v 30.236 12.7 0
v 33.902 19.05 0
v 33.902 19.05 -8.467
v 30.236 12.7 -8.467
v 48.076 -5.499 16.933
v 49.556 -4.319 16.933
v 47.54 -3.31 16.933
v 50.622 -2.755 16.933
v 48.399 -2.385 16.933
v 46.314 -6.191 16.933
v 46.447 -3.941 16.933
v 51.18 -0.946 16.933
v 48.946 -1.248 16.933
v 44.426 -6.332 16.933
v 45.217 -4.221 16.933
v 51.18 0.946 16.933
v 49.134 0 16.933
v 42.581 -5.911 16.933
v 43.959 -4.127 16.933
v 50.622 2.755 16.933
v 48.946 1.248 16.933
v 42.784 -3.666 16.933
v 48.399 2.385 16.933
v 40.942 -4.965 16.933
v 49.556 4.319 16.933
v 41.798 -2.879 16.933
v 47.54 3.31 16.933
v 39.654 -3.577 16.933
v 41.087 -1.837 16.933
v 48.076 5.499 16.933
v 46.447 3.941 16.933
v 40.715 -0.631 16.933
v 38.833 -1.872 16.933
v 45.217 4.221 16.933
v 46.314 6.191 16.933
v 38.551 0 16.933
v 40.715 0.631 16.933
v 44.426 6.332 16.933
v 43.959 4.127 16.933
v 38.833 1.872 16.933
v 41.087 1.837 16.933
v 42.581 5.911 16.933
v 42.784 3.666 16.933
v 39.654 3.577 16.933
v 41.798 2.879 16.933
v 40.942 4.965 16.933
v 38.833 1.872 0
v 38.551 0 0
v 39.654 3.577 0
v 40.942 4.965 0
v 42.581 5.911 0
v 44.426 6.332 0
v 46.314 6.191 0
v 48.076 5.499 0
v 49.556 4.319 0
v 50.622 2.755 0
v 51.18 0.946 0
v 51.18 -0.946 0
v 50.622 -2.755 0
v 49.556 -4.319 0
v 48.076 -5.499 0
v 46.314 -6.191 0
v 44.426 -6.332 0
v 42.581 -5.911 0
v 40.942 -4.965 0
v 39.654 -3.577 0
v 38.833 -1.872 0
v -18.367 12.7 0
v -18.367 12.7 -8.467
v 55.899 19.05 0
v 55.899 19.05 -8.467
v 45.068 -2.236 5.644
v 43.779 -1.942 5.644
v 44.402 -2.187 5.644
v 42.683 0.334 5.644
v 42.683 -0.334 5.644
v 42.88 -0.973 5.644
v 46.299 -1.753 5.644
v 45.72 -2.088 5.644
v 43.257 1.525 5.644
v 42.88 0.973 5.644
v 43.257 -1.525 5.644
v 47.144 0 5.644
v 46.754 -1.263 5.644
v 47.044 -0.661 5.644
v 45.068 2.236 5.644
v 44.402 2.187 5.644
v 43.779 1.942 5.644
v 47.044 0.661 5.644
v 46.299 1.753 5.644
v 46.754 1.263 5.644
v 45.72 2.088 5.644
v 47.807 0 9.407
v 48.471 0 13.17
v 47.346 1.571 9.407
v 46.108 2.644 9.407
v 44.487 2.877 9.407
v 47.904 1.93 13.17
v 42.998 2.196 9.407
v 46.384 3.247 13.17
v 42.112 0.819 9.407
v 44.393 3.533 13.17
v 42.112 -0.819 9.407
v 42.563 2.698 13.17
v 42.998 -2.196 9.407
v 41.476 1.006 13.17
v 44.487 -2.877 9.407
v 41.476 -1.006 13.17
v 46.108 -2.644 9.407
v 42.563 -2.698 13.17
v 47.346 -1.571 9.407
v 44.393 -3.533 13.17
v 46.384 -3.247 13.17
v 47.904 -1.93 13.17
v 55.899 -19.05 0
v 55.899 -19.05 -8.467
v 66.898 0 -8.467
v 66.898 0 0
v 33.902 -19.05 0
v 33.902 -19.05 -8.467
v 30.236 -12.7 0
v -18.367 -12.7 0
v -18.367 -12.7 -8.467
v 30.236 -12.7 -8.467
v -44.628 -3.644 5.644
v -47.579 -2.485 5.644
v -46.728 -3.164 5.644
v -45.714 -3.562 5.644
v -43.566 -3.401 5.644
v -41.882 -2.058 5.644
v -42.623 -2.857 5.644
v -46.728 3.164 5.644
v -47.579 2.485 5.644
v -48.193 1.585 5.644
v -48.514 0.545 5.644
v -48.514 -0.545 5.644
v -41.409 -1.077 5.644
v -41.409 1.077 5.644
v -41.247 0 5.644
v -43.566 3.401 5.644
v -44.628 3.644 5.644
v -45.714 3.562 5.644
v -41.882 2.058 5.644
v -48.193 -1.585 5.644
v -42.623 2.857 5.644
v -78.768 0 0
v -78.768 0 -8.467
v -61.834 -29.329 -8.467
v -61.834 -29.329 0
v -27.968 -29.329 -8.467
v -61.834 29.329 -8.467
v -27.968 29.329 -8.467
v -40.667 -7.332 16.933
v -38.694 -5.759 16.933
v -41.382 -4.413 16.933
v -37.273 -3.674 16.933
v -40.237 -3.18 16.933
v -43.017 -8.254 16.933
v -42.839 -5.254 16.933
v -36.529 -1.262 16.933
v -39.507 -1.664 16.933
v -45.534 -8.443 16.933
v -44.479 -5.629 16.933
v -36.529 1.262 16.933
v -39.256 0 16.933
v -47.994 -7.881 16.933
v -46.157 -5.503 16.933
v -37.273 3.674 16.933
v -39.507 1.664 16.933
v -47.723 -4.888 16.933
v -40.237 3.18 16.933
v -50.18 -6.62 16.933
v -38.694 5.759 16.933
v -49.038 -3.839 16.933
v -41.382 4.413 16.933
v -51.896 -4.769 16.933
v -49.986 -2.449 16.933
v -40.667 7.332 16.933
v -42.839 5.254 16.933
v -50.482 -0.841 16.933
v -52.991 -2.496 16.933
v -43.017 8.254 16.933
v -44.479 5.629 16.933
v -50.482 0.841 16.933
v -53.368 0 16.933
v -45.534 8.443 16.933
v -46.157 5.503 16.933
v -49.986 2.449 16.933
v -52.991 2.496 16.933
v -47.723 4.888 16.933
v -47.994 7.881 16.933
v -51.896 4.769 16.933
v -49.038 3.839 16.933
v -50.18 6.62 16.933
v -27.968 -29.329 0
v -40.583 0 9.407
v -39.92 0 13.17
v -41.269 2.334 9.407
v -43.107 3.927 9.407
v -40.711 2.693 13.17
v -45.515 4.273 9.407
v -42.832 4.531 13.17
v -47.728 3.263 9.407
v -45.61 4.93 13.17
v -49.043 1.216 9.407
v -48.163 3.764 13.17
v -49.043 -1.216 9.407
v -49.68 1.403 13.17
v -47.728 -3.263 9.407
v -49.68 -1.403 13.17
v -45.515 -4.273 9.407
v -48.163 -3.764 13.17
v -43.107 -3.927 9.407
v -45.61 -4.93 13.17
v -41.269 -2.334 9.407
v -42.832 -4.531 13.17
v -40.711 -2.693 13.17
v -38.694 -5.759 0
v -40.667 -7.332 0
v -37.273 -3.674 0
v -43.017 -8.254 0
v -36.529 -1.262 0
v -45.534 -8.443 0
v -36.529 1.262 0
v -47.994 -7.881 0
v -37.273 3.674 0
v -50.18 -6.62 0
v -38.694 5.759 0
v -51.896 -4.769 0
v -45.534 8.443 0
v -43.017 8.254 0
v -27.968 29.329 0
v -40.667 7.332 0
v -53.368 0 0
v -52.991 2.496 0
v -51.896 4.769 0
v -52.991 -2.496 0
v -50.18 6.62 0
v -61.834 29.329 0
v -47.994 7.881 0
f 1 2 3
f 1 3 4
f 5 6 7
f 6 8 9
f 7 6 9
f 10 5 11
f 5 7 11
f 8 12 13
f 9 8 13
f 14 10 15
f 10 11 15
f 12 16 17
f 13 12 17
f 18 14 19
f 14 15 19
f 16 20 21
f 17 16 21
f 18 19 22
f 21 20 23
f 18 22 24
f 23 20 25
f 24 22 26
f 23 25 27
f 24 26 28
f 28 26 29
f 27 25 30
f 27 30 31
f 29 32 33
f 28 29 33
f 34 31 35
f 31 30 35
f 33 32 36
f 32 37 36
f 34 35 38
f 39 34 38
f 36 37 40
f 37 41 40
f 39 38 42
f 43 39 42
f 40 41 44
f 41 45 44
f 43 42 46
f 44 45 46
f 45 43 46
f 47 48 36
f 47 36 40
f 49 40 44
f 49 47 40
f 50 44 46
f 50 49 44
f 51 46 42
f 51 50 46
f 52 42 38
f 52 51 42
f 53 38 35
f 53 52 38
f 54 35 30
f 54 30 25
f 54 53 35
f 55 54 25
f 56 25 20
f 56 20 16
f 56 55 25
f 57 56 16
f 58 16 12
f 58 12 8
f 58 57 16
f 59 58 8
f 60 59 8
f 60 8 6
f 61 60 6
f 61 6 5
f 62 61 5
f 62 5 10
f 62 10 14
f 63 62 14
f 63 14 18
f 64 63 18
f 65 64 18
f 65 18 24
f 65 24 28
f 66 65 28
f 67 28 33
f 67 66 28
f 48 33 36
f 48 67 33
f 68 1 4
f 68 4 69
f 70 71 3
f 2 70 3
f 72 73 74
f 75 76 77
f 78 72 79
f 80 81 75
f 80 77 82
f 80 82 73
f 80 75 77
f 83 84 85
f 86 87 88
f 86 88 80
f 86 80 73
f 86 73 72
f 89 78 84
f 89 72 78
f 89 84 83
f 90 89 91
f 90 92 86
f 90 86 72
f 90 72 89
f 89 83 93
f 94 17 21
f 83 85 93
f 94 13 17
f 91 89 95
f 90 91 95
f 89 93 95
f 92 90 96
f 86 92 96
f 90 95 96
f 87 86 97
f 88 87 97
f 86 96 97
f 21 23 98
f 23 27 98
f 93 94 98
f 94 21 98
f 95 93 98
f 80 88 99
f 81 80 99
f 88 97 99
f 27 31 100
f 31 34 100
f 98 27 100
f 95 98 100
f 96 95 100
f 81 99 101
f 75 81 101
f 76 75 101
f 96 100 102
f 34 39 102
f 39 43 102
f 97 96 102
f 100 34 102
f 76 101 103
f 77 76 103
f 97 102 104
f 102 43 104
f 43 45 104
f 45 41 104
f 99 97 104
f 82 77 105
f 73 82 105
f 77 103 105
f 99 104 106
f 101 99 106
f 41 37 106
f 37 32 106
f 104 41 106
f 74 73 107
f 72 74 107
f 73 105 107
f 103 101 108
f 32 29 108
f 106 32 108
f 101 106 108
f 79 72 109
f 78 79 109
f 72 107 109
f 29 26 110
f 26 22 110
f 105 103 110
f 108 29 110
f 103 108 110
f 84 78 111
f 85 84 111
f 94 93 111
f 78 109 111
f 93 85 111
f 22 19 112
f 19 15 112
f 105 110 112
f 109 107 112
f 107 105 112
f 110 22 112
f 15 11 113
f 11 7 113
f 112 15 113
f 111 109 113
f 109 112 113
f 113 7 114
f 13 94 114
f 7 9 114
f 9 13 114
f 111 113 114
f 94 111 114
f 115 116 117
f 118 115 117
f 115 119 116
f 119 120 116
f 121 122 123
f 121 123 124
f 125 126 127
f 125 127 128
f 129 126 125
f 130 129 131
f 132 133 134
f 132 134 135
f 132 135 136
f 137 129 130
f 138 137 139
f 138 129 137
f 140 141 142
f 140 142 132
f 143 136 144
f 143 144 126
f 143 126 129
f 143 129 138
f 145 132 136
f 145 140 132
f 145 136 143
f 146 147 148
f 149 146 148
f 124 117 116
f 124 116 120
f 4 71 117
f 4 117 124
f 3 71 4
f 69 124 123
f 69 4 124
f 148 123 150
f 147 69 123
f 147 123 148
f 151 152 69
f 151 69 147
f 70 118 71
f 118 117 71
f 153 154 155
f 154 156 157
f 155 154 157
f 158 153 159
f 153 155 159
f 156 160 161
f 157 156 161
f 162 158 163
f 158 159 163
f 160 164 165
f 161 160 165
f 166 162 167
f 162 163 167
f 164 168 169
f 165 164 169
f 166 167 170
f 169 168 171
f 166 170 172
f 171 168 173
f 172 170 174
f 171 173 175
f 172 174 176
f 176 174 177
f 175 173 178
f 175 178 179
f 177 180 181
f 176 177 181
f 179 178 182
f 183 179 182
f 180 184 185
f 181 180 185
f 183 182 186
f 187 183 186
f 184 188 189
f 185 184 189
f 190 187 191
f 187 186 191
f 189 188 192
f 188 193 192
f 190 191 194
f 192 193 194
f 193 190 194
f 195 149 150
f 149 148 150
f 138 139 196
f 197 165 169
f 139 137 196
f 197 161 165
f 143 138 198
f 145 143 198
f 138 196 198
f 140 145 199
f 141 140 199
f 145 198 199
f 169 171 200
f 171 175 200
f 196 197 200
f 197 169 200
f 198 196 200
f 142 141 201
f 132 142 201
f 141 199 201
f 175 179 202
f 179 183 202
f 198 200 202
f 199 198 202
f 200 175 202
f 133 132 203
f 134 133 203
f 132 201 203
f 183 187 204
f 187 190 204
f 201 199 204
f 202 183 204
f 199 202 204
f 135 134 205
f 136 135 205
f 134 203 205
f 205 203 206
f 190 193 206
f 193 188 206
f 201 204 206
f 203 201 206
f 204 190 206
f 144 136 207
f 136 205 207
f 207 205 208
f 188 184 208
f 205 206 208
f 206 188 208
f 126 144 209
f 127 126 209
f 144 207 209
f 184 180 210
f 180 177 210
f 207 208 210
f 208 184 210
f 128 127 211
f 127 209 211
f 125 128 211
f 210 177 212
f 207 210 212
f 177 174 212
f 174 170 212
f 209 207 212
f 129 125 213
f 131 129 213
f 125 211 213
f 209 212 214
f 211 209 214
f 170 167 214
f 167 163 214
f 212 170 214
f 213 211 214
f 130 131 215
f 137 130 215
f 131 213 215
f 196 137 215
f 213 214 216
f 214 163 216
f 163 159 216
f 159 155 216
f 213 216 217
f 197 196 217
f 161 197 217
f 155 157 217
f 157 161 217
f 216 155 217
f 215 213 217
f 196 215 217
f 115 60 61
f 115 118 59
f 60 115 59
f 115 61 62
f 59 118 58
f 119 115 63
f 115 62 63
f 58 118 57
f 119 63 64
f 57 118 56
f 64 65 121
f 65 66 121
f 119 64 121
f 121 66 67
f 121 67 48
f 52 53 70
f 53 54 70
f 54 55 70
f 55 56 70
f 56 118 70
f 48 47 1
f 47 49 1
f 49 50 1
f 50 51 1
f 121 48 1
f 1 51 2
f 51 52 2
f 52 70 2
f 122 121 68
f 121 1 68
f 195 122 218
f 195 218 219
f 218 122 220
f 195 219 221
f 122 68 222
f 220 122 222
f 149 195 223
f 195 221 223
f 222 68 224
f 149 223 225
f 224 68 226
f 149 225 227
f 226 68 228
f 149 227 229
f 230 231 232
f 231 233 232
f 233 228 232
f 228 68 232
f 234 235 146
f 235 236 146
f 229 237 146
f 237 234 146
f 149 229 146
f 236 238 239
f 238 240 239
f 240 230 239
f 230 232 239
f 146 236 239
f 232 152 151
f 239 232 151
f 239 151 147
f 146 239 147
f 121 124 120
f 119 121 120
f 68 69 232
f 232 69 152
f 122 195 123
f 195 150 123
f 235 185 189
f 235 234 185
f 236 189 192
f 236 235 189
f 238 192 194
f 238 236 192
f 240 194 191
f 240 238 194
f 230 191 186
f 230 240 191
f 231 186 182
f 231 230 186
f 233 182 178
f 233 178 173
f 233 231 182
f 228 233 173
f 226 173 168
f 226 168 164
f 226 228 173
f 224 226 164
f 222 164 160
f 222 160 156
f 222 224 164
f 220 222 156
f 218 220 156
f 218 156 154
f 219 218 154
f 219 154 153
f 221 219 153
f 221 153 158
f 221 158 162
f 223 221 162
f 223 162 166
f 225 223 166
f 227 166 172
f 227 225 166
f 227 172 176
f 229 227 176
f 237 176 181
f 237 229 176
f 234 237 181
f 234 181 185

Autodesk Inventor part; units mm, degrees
ref_plane "YZ Plane" through (0, 0, 0) normal (1, 0, 0) x (0, 1, 0)
ref_plane "XZ Plane" through (0, 0, 0) normal (0, 1, 0) x (-1, 0, 0)
ref_plane "XY Plane" through (0, 0, 0) normal (0, 0, 1) x (1, 0, 0)
sketch "Sketch1" plane through (0, 0, 0) normal (0, 0, 1) x (1, 0, 0)
  circle A0 centre (-43.9941, 0) radius 9.525
  circle A1 centre (43.9941, 0) radius 6.35
  line L0 (43.9941, 0) -> (-43.9941, 0) construction
  line L1 (43.9941, 12.7) -> (-43.9941, 12.7)
  line L2 (-43.9941, -12.7) -> (43.9941, -12.7)
  arc A2 (43.9941, -12.7) -> (43.9941, 12.7) centre (43.9941, 0) ccw
  arc A3 (-43.9941, 12.7) -> (-43.9941, -12.7) centre (-43.9941, 0) ccw
  point P0 (0, 0)
  point P1 (0, 0)
  dimension "d10" = 12.7
  dimension "d11" = 19.05
  dimension "d12" = 87.9881
  dimension "d13" = 12.7
sketch "Sketch3" plane through (0, 0, 0) normal (0, 0, 1) x (1, 0, 0)
  line L0 (-44.9008, 0) -> (44.9008, 0) construction
  line L1 (-44.9008, -12.7) -> (44.9008, -12.7)
  line L2 (44.9008, 12.7) -> (-44.9008, 12.7)
  arc A0 (-44.9008, 12.7) -> (-44.9008, -12.7) centre (-44.9008, 0) ccw
  arc A1 (44.9008, -12.7) -> (44.9008, 12.7) centre (44.9008, 0) ccw
  circle A2 centre (-44.9008, 0) radius 6.35
  point P0 (0, 0)
  dimension "d23" = 44.9008
  dimension "d24" = 25.4
  dimension "d25" = 12.7
extrude "Extrusion4" add sketch "Sketch3" against normal blind 8.4667
sketch "Sketch4" plane through (0, 0, -8.4667) normal (0, 0, -1) x (-1, 0, 0)
  circle A0 centre (-44.9008, 0) radius 6.35
  arc A1 (-44.9008, 12.7) -> (-44.9008, -12.7) centre (-44.9008, 0) ccw projected
  point P0 (0, 0)
  dimension "d28" = 12.7
extrude "Extrusion5" cut sketch "Sketch4" against normal through all
sketch "Sketch5" plane through (0, 0, -8.4667) normal (0, 0, -1) x (-1, 0, 0)
  circle A0 centre (44.9008, 0) radius 6.35 projected
  line L0 (61.8342, 29.3294) -> (78.7675, 0)
  line L1 (78.7675, 0) -> (61.8342, -29.3294)
  line L2 (61.8342, -29.3294) -> (27.9675, -29.3294)
  line L3 (27.9675, -29.3294) -> (11.0342, 0)
  line L4 (11.0342, 0) -> (27.9675, 29.3294)
  line L5 (27.9675, 29.3294) -> (61.8342, 29.3294)
  line L6 (-44.9008, 12.7) -> (44.9008, 12.7) projected
  point P0 (0, 0)
  dimension "d31" = 33.8667
extrude "Extrusion6" add sketch "Sketch5" against normal up to surface (8.4667 mm away)
sketch "Sketch7" plane through (0, 0, -8.4667) normal (0, 0, -1) x (-1, 0, 0)
  circle A0 centre (-44.9008, 0) radius 6.35 projected
  circle A1 centre (-44.9008, 0) radius 12.7
  line L0 (-44.9008, -12.7) -> (18.3665, -12.7) projected
  line L1 (-66.8979, 0) -> (-55.8994, 19.05)
  line L2 (-55.8994, 19.05) -> (-33.9023, 19.05)
  line L3 (-33.9023, 19.05) -> (-22.9038, 0)
  line L4 (-22.9038, 0) -> (-33.9023, -19.05)
  line L5 (-33.9023, -19.05) -> (-55.8994, -19.05)
  line L6 (-55.8994, -19.05) -> (-66.8979, 0)
  point P0 (0, 0)
  point P1 (5.3062, -12.7)
  dimension "d48" = 38.1
extrude "Extrusion8" add sketch "Sketch7" against normal up to surface (8.4667 mm away) contours L1 L2 L3 L4 L5 L6
sketch "Sketch12" plane through (0, 0, -8.4667) normal (0, 0, -1) x (-1, 0, 0)
  circle A0 centre (44.9008, 0) radius 6.35 projected
  circle A1 centre (44.9008, 0) radius 8.4667
  point P0 (0, 0)
  dimension "d73" = 16.9333
extrude "Extrusion12" add sketch "Sketch12" against normal blind 25.4 contours A0 | A1
sketch "Sketch13" plane through (-44.9008, 0, 16.9333) normal (0, 0, 1) x (1, 0, 0)
  circle A0 centre (0, 0) radius 8.4667 projected
  circle A1 centre (0, 0) radius 8.4667 projected
  circle A2 centre (0, 0) radius 5.6444
  point P0 (44.9008, 0)
  dimension "d76" = 11.2889
extrude "Extrusion13" cut sketch "Sketch13" against normal blind 11.2889 draft -10 contours A2
sketch "Sketch14" plane through (0, 0, -8.4667) normal (0, 0, -1) x (-1, 0, 0)
  circle A0 centre (-44.9008, 0) radius 6.35 projected
  circle A1 centre (-44.9008, 0) radius 6.35
  point P0 (0, 0)
  dimension "d79" = 12.7
extrude "Extrusion14" add sketch "Sketch14" against normal blind 25.4
sketch "Sketch15" plane through (44.9008, 0, 16.9333) normal (0, 0, 1) x (1, 0, 0)
  circle A0 centre (0, 0) radius 6.35 projected
  circle A1 centre (0, 0) radius 4.2333
  point P0 (-44.9008, 0)
  dimension "d82" = 8.4667
extrude "Extrusion15" cut sketch "Sketch15" against normal blind 11.2889 draft -10 contours A1
properties part number "Frame" material "ABS Plastic"
